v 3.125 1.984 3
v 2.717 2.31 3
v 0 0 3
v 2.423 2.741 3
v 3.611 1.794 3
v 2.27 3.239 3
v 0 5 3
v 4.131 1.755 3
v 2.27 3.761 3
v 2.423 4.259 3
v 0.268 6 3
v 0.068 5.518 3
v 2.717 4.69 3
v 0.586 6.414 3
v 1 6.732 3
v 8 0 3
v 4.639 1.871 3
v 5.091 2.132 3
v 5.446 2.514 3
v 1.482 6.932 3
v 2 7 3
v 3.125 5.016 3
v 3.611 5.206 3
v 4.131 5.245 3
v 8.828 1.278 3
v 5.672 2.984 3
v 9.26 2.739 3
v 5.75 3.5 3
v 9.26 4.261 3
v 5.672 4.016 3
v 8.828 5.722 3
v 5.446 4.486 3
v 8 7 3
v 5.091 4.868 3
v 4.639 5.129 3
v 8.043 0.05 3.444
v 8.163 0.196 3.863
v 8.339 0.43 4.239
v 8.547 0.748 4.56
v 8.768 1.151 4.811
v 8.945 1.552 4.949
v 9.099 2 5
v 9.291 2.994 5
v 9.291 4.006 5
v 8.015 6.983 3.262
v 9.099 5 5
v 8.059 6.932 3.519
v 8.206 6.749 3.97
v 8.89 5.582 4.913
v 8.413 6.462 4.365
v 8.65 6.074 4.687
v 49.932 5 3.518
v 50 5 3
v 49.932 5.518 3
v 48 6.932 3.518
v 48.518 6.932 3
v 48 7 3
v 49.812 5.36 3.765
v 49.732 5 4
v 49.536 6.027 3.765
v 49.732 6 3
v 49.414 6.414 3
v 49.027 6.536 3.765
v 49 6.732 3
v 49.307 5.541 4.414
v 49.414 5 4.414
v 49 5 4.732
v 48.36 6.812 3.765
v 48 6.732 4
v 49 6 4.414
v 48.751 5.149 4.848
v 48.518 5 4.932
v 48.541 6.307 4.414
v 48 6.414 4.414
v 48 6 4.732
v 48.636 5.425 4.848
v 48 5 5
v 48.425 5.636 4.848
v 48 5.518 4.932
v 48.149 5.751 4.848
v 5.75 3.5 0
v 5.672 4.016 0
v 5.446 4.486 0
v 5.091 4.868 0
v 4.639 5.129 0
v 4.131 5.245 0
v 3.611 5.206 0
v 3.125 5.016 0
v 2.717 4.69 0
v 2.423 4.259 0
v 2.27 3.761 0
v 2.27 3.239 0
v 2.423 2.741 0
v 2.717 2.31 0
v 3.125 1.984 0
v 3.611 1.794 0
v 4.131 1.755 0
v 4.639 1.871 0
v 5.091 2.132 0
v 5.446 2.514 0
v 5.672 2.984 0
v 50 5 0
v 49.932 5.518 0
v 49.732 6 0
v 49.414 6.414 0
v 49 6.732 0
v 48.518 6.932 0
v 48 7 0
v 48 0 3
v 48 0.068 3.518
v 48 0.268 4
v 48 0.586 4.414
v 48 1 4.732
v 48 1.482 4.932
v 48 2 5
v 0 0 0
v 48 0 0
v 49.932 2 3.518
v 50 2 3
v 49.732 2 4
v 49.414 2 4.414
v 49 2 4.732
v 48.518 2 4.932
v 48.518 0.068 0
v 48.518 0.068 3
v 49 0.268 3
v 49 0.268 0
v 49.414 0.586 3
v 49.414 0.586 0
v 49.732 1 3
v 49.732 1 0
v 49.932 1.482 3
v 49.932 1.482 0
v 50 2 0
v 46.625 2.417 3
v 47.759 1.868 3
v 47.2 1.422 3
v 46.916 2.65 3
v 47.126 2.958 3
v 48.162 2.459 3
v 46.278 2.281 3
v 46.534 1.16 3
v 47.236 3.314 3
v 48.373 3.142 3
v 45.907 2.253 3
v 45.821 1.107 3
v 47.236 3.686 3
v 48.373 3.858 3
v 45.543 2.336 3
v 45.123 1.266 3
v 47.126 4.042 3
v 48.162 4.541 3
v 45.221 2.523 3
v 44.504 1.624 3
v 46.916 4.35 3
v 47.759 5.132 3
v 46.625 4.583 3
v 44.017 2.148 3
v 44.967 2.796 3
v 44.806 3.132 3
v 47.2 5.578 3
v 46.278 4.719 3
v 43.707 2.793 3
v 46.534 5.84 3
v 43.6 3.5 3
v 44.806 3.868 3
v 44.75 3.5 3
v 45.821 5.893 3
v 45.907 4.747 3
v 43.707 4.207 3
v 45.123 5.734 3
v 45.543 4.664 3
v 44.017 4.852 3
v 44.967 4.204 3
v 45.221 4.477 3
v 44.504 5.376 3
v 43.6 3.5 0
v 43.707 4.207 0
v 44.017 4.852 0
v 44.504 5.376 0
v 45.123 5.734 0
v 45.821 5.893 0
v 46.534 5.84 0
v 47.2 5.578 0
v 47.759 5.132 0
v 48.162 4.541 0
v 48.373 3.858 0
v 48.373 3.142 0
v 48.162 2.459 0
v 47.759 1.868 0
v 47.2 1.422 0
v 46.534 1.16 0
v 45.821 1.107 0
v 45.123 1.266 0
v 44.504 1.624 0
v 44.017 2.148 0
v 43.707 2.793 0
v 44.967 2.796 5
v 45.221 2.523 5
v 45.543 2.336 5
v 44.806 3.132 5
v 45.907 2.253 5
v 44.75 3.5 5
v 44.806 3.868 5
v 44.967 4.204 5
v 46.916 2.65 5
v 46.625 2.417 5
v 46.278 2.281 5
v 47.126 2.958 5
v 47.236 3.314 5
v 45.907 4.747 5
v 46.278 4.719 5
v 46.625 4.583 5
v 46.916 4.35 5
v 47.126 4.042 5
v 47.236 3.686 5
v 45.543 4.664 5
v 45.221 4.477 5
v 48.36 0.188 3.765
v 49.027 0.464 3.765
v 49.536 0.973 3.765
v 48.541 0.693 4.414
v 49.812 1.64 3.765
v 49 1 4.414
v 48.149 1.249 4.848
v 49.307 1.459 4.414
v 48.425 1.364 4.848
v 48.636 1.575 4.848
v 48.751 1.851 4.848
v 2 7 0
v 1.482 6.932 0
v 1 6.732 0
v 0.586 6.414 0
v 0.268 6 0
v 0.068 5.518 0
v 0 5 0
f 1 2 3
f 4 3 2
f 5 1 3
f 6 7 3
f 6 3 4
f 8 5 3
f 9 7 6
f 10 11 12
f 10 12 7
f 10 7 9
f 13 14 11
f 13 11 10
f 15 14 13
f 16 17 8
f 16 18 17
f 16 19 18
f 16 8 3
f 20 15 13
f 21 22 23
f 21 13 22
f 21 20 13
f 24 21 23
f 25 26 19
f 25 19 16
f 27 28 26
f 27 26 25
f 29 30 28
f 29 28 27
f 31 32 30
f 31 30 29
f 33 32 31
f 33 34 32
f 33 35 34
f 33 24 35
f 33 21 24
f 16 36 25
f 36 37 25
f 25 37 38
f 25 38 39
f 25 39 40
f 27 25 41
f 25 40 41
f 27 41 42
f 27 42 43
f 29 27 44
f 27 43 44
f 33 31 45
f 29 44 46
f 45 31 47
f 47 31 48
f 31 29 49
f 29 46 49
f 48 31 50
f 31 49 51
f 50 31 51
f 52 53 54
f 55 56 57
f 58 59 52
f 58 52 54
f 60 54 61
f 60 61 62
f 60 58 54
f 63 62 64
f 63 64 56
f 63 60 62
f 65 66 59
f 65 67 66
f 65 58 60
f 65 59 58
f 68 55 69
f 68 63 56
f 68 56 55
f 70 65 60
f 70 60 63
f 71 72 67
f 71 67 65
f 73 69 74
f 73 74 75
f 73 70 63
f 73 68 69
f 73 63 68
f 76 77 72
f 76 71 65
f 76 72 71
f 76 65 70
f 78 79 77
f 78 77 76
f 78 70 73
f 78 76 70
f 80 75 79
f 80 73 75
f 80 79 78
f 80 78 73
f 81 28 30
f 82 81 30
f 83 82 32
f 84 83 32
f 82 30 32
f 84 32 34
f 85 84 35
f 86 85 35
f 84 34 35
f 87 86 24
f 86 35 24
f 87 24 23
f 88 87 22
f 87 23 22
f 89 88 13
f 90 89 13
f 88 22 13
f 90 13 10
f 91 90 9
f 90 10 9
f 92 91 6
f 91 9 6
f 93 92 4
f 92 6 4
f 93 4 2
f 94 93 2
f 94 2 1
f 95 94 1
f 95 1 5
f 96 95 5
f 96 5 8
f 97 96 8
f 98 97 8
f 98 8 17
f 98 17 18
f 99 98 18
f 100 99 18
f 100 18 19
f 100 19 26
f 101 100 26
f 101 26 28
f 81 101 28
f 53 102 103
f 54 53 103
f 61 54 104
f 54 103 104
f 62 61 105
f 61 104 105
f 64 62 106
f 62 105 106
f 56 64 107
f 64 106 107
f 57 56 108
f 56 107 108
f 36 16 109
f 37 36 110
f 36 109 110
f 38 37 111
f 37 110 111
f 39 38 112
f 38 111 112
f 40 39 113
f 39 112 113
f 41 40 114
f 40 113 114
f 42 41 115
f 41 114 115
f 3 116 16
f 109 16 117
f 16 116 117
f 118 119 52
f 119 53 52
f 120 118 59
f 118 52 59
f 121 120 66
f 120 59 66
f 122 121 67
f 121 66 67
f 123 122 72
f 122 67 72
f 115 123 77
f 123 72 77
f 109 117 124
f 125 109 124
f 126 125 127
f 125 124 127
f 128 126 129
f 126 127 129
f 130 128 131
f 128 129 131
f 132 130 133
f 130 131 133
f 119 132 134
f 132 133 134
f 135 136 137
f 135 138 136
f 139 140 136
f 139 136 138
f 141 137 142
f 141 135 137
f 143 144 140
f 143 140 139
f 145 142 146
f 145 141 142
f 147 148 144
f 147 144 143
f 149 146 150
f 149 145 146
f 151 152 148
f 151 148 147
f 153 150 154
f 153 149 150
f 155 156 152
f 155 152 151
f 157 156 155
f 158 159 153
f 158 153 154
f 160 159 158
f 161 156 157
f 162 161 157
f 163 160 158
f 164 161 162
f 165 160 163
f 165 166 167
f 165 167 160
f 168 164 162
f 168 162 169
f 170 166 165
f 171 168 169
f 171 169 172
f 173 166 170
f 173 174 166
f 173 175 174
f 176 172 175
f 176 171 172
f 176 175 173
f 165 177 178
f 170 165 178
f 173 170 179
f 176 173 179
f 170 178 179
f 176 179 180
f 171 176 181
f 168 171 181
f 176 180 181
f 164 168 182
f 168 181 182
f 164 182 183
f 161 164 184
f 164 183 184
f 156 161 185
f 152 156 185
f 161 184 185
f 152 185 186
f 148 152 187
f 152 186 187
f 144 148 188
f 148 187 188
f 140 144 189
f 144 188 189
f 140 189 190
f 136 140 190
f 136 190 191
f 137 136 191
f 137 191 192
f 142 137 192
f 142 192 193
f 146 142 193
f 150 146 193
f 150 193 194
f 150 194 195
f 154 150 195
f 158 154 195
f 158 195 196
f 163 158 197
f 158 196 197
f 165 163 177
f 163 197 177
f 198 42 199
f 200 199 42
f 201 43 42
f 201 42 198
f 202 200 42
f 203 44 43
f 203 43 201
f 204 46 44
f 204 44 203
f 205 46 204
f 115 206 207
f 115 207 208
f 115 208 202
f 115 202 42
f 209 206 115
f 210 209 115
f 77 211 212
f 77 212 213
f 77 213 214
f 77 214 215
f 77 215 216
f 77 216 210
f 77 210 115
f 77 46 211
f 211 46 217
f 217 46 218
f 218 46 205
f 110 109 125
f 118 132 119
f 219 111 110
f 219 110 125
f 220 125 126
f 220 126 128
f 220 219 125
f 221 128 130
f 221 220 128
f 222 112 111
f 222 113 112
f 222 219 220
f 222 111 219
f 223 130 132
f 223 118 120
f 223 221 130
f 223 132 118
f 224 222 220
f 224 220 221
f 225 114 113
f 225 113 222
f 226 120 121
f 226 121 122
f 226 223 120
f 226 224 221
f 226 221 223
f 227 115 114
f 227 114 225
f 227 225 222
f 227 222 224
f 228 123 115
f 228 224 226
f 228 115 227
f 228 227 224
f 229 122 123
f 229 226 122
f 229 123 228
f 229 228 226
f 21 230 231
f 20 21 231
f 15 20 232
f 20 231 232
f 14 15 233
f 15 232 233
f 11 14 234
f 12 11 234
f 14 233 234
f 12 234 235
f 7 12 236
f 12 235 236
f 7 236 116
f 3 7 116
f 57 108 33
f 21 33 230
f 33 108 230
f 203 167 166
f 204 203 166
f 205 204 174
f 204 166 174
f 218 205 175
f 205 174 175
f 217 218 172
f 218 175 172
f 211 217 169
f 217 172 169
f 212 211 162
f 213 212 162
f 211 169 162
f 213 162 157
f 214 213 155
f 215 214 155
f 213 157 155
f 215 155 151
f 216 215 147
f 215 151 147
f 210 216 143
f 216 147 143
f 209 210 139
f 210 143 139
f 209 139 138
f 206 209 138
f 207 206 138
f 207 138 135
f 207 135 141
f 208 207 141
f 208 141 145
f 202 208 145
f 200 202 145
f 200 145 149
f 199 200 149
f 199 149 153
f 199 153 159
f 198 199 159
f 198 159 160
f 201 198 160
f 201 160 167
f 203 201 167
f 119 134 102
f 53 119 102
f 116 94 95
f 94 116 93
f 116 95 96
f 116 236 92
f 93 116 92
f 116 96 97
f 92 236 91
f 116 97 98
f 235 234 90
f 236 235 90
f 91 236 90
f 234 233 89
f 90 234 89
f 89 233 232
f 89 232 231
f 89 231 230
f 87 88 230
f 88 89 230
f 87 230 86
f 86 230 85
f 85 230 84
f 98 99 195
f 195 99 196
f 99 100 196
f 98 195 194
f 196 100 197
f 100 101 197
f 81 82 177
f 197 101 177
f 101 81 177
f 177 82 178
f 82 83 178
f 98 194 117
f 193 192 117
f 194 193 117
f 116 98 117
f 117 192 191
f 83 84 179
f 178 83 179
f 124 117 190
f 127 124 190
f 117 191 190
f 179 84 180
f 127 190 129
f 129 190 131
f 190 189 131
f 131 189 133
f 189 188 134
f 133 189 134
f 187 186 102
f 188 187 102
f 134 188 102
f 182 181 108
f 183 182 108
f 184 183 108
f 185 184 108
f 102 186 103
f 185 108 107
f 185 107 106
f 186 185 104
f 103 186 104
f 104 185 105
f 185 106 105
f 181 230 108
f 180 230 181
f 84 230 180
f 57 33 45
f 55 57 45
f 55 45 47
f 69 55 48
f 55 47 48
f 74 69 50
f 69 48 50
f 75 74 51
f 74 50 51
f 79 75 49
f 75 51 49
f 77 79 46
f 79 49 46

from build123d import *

# Parameters (mm, degrees)
BOSS_EXTRUDE1_DEPTH = 5
SKETCH2_R           = 2.4
CUT_EXTRUDE1_DEPTH  = 3
SKETCH3_R           = 1.25
CUT_EXTRUDE2_DEPTH  = 51.576674466
FILLET1_R           = 2
SKETCH4_R           = 1.75
CUT_EXTRUDE3_DEPTH  = 51.734603576
SKETCH5_R           = 5.315072906
CUT_EXTRUDE4_DEPTH  = 2


with BuildPart() as part:
    # Sketch1 → Boss-Extrude1 (new body)
    with BuildSketch(Plane.XY):
        with BuildLine():
            Line((0, 0), (48, 0))
            ThreePointArc((48, 0), (49.414213562, 0.585786438), (50, 2))
            Line((50, 2), (50, 5))
            ThreePointArc((50, 5), (49.414213562, 6.414213562), (48, 7))
            Line((48, 7), (2, 7))
            ThreePointArc((2, 7), (0.585786438, 6.414213562), (0, 5))
            Line((0, 5), (0, 0))
        make_face()
    extrude(amount=BOSS_EXTRUDE1_DEPTH)

    # Sketch2 → Cut-Extrude1 (cut)
    with BuildSketch(Plane(origin=(0, 0, 0), x_dir=(-1, 0, 0), z_dir=(0, 0, -1))):
        with Locations((-46, 3.5)):
            Circle(SKETCH2_R)
    extrude(amount=-CUT_EXTRUDE1_DEPTH, mode=Mode.SUBTRACT)

    # Sketch3 → Cut-Extrude2 (cut, through all)
    with BuildSketch(Plane(origin=(0, 0, 3), x_dir=(-1, 0, 0), z_dir=(0, 0, -1))):
        with Locations((-46, 3.5)):
            Circle(SKETCH3_R)
    extrude(amount=-CUT_EXTRUDE2_DEPTH, mode=Mode.SUBTRACT)

    # Fillet1
    fillet1_edges = [part.edges().sort_by_distance(p)[0] for p in [
        (49.414213562, 0.585786438, 5),
        (50, 3.5, 5),
        (49.414213562, 6.414213562, 5),
        (25, 7, 5),
        (0.585786438, 6.414213562, 5),
        (0, 2.5, 5),
        (24, 0, 5),
    ]]
    fillet(fillet1_edges, radius=FILLET1_R)

    # Sketch4 → Cut-Extrude3 (cut, through all)
    with BuildSketch(Plane.XY.offset(5)):
        with Locations((4, 3.5)):
            Circle(SKETCH4_R)
    extrude(amount=-CUT_EXTRUDE3_DEPTH, mode=Mode.SUBTRACT)

    # Sketch5 → Cut-Extrude4 (cut)
    with BuildSketch(Plane.XY.offset(5)):
        with Locations((4, 3.5)):
            Circle(SKETCH5_R)
    extrude(amount=-CUT_EXTRUDE4_DEPTH, mode=Mode.SUBTRACT)


solid = part.part
